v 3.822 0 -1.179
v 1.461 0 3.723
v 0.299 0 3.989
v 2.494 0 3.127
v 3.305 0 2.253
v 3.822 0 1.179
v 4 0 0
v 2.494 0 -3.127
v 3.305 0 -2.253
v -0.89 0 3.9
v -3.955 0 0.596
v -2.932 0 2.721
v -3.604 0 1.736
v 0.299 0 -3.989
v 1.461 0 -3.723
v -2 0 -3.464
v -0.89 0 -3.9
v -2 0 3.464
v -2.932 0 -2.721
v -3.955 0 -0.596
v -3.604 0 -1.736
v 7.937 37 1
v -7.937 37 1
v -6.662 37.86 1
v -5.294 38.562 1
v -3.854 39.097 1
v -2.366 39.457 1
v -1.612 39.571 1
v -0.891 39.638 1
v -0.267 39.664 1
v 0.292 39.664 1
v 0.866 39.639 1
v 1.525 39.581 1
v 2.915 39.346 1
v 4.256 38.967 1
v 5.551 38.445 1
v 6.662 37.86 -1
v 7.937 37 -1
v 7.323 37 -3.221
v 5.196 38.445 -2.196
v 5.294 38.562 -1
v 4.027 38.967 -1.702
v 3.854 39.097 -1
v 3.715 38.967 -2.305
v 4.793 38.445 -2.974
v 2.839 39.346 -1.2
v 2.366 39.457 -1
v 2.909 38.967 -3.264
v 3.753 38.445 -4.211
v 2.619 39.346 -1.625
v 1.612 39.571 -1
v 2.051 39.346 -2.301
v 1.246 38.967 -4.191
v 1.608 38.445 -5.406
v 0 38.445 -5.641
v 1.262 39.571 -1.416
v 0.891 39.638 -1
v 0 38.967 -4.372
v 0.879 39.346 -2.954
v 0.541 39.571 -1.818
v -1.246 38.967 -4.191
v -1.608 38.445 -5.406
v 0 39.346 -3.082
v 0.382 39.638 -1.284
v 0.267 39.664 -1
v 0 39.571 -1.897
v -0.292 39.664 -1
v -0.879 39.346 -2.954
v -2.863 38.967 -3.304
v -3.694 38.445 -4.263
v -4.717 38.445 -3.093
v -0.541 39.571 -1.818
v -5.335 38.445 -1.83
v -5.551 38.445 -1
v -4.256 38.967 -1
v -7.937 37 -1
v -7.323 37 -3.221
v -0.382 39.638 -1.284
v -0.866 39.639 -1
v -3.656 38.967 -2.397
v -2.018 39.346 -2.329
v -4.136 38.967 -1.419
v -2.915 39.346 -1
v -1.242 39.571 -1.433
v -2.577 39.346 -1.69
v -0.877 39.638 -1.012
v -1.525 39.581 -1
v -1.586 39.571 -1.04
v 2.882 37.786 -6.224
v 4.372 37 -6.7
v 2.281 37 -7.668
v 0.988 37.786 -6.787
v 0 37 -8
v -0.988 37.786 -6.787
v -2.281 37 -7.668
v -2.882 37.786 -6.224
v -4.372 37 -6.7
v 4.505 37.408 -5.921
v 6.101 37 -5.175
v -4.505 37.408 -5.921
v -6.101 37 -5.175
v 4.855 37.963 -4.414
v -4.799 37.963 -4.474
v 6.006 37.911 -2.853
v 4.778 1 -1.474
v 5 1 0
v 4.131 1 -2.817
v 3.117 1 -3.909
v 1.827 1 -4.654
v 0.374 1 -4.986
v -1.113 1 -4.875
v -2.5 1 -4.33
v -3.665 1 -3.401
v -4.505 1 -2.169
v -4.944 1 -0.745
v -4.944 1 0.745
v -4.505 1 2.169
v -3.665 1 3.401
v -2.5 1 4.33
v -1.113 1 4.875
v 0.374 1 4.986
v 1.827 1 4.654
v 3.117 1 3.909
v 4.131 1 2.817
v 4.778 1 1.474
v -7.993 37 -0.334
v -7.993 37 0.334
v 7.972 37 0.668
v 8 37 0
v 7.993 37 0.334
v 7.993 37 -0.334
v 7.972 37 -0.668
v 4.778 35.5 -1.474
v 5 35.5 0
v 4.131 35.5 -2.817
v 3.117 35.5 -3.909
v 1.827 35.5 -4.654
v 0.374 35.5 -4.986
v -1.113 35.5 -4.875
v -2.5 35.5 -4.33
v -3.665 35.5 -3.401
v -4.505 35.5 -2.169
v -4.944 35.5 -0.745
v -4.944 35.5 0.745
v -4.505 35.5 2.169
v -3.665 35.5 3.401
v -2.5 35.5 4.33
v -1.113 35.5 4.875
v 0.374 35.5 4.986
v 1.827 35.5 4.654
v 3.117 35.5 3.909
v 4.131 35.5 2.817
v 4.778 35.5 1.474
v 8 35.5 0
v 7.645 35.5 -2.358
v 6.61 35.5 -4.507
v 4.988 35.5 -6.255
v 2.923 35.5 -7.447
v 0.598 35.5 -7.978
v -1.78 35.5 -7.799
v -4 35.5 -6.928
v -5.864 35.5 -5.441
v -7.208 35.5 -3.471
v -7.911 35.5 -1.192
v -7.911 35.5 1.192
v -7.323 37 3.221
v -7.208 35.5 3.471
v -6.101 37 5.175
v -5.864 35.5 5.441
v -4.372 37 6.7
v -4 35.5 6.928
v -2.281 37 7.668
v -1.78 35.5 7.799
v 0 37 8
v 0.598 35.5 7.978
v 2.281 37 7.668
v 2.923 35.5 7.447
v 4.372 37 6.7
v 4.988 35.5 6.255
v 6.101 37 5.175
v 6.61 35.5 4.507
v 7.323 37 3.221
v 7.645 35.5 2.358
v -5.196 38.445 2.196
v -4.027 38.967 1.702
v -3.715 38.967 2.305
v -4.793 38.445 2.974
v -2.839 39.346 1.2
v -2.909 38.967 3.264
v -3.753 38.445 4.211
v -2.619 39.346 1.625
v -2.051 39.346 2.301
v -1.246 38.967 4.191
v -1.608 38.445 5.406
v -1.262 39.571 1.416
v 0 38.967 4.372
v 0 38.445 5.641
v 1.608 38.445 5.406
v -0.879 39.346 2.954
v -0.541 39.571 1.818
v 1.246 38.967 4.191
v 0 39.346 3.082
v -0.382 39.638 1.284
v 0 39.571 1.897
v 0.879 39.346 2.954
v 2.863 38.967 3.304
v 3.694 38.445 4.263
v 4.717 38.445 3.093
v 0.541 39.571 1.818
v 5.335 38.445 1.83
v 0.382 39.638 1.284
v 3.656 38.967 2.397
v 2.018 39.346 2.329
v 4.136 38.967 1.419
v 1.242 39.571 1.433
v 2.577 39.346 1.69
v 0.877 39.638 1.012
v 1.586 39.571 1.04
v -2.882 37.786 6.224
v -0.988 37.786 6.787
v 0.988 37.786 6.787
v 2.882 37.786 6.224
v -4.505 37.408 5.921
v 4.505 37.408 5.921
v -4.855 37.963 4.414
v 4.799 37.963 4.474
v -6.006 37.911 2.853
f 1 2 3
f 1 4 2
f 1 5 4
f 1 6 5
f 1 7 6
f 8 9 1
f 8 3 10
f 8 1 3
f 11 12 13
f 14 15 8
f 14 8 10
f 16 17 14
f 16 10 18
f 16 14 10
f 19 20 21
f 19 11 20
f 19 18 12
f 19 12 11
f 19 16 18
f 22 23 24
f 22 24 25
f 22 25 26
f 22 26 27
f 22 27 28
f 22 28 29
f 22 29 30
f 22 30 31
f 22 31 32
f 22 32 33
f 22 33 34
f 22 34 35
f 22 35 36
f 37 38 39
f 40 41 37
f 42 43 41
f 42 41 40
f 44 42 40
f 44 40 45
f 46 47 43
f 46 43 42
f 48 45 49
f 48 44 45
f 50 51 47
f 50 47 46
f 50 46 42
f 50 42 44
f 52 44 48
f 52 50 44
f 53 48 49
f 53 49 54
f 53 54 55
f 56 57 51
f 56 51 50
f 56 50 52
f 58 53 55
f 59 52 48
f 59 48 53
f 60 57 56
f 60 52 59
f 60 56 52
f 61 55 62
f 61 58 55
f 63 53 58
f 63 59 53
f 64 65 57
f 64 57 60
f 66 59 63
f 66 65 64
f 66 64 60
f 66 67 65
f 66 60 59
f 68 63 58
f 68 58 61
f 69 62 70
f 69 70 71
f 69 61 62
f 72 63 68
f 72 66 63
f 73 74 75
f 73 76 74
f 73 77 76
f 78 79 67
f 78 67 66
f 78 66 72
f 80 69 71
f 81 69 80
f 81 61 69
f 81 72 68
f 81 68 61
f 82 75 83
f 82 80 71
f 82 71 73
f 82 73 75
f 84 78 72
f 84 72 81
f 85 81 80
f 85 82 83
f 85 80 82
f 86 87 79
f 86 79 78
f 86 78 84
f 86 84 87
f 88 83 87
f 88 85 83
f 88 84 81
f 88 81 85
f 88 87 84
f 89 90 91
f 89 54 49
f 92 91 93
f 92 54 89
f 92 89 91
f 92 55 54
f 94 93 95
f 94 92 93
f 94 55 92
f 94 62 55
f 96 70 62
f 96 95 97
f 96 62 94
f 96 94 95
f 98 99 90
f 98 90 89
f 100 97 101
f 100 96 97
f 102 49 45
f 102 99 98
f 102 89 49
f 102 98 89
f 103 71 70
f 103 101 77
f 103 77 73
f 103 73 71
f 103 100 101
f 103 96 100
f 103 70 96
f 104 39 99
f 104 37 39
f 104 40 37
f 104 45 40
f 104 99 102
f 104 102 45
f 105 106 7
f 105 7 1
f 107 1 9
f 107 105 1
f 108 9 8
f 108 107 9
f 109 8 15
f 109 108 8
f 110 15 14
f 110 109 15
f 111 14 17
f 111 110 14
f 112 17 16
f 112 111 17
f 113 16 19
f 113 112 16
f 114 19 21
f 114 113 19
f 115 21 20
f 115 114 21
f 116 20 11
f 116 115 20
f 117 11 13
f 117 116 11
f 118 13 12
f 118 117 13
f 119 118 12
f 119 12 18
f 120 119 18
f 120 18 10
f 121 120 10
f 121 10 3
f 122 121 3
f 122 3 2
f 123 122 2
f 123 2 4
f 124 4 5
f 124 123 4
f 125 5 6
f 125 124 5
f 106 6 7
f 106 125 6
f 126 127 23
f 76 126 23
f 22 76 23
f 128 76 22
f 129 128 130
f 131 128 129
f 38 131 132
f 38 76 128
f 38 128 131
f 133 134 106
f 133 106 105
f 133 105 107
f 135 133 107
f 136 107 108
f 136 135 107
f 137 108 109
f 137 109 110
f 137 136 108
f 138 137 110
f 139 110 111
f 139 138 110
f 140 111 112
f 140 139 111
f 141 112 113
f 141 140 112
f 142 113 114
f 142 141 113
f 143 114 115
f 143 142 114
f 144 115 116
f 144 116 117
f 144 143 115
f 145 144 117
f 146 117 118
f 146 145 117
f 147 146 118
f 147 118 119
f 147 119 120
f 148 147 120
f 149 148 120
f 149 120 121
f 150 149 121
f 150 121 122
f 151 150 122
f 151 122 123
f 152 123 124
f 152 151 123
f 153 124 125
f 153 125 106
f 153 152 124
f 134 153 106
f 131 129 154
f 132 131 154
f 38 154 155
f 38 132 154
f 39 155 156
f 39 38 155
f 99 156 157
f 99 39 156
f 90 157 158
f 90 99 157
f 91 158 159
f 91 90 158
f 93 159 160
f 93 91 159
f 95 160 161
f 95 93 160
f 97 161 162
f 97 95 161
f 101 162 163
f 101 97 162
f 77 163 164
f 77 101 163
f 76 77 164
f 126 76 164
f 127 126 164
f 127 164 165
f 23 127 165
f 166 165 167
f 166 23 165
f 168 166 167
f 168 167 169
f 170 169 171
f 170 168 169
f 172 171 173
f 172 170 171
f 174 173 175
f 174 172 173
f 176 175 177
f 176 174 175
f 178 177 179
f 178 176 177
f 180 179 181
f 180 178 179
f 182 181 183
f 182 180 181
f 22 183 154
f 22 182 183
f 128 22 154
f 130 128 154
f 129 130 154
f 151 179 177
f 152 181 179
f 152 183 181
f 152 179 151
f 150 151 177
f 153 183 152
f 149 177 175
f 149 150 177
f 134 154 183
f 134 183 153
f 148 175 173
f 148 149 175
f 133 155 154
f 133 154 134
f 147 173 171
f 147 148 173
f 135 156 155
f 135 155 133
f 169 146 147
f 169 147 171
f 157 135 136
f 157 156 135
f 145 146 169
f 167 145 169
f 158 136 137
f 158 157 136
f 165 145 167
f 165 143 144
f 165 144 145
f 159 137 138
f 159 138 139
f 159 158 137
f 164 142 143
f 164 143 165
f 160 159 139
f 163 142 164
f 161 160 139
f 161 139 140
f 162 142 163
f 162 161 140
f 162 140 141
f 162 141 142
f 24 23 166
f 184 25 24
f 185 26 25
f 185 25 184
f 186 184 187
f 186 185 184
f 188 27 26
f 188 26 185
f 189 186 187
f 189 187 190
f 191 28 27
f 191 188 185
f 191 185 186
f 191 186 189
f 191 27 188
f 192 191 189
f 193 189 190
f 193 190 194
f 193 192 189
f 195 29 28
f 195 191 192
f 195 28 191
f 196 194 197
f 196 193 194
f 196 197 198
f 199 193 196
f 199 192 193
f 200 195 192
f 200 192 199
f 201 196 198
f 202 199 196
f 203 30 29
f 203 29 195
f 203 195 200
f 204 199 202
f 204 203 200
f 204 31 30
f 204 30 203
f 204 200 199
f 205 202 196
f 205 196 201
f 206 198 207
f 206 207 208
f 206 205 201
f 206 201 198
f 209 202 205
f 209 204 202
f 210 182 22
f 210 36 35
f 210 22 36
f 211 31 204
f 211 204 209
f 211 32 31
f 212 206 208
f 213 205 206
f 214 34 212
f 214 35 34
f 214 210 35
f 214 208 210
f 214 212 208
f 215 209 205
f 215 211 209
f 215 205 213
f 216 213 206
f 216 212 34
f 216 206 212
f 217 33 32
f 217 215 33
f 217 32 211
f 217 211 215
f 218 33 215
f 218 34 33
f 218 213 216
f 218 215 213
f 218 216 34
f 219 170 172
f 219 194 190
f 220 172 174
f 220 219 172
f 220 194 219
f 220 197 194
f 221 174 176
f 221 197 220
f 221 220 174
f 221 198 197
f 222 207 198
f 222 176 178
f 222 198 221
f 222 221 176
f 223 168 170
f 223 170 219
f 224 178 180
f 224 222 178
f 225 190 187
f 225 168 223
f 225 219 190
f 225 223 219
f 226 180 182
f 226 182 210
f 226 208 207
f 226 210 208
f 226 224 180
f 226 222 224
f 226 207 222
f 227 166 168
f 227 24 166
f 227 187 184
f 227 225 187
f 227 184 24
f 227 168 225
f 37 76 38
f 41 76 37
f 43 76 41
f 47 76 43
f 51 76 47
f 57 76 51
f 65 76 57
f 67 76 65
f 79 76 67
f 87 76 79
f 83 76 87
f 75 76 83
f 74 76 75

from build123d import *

# Parameters (mm, degrees)
SFAZOWANIE1_SIZE           = 1
SZKIC5_W                   = 16
SZKIC5_H                   = 2
WYTNIJ_WYCI_GNI_CIE7_DEPTH = 39.691084286


with BuildPart() as part:
    # Szkic1 → Obrót1 (revolve)
    with BuildSketch(Plane.XY):
        with BuildLine():
            Line((0, 0), (5, 0))
            Line((5, 0), (5, 35.5))
            Line((5, 35.5), (8, 35.5))
            Line((8, 35.5), (8, 37))
            ThreePointArc((8, 37), (4.225307725, 39.017578445), (0, 39.7))
            Line((0, 39.7), (0, 0))
        make_face()
    revolve(axis=Axis((0, 0, 0), (0, 1, 0)))

    # Sfazowanie1
    sfazowanie1_edges = [part.edges().sort_by_distance(p)[0] for p in [
        (-5, 0, 0),
    ]]
    chamfer(sfazowanie1_edges, length=SFAZOWANIE1_SIZE)

    # Szkic5 → Wytnij-wyciągnięcie7 (cut, through all)
    with BuildSketch(Plane(origin=(0, 37, 0), x_dir=(1, 0, 0), z_dir=(0, 1, 0))):
        Rectangle(SZKIC5_W, SZKIC5_H)
    extrude(amount=WYTNIJ_WYCI_GNI_CIE7_DEPTH, mode=Mode.SUBTRACT)


solid = part.part
